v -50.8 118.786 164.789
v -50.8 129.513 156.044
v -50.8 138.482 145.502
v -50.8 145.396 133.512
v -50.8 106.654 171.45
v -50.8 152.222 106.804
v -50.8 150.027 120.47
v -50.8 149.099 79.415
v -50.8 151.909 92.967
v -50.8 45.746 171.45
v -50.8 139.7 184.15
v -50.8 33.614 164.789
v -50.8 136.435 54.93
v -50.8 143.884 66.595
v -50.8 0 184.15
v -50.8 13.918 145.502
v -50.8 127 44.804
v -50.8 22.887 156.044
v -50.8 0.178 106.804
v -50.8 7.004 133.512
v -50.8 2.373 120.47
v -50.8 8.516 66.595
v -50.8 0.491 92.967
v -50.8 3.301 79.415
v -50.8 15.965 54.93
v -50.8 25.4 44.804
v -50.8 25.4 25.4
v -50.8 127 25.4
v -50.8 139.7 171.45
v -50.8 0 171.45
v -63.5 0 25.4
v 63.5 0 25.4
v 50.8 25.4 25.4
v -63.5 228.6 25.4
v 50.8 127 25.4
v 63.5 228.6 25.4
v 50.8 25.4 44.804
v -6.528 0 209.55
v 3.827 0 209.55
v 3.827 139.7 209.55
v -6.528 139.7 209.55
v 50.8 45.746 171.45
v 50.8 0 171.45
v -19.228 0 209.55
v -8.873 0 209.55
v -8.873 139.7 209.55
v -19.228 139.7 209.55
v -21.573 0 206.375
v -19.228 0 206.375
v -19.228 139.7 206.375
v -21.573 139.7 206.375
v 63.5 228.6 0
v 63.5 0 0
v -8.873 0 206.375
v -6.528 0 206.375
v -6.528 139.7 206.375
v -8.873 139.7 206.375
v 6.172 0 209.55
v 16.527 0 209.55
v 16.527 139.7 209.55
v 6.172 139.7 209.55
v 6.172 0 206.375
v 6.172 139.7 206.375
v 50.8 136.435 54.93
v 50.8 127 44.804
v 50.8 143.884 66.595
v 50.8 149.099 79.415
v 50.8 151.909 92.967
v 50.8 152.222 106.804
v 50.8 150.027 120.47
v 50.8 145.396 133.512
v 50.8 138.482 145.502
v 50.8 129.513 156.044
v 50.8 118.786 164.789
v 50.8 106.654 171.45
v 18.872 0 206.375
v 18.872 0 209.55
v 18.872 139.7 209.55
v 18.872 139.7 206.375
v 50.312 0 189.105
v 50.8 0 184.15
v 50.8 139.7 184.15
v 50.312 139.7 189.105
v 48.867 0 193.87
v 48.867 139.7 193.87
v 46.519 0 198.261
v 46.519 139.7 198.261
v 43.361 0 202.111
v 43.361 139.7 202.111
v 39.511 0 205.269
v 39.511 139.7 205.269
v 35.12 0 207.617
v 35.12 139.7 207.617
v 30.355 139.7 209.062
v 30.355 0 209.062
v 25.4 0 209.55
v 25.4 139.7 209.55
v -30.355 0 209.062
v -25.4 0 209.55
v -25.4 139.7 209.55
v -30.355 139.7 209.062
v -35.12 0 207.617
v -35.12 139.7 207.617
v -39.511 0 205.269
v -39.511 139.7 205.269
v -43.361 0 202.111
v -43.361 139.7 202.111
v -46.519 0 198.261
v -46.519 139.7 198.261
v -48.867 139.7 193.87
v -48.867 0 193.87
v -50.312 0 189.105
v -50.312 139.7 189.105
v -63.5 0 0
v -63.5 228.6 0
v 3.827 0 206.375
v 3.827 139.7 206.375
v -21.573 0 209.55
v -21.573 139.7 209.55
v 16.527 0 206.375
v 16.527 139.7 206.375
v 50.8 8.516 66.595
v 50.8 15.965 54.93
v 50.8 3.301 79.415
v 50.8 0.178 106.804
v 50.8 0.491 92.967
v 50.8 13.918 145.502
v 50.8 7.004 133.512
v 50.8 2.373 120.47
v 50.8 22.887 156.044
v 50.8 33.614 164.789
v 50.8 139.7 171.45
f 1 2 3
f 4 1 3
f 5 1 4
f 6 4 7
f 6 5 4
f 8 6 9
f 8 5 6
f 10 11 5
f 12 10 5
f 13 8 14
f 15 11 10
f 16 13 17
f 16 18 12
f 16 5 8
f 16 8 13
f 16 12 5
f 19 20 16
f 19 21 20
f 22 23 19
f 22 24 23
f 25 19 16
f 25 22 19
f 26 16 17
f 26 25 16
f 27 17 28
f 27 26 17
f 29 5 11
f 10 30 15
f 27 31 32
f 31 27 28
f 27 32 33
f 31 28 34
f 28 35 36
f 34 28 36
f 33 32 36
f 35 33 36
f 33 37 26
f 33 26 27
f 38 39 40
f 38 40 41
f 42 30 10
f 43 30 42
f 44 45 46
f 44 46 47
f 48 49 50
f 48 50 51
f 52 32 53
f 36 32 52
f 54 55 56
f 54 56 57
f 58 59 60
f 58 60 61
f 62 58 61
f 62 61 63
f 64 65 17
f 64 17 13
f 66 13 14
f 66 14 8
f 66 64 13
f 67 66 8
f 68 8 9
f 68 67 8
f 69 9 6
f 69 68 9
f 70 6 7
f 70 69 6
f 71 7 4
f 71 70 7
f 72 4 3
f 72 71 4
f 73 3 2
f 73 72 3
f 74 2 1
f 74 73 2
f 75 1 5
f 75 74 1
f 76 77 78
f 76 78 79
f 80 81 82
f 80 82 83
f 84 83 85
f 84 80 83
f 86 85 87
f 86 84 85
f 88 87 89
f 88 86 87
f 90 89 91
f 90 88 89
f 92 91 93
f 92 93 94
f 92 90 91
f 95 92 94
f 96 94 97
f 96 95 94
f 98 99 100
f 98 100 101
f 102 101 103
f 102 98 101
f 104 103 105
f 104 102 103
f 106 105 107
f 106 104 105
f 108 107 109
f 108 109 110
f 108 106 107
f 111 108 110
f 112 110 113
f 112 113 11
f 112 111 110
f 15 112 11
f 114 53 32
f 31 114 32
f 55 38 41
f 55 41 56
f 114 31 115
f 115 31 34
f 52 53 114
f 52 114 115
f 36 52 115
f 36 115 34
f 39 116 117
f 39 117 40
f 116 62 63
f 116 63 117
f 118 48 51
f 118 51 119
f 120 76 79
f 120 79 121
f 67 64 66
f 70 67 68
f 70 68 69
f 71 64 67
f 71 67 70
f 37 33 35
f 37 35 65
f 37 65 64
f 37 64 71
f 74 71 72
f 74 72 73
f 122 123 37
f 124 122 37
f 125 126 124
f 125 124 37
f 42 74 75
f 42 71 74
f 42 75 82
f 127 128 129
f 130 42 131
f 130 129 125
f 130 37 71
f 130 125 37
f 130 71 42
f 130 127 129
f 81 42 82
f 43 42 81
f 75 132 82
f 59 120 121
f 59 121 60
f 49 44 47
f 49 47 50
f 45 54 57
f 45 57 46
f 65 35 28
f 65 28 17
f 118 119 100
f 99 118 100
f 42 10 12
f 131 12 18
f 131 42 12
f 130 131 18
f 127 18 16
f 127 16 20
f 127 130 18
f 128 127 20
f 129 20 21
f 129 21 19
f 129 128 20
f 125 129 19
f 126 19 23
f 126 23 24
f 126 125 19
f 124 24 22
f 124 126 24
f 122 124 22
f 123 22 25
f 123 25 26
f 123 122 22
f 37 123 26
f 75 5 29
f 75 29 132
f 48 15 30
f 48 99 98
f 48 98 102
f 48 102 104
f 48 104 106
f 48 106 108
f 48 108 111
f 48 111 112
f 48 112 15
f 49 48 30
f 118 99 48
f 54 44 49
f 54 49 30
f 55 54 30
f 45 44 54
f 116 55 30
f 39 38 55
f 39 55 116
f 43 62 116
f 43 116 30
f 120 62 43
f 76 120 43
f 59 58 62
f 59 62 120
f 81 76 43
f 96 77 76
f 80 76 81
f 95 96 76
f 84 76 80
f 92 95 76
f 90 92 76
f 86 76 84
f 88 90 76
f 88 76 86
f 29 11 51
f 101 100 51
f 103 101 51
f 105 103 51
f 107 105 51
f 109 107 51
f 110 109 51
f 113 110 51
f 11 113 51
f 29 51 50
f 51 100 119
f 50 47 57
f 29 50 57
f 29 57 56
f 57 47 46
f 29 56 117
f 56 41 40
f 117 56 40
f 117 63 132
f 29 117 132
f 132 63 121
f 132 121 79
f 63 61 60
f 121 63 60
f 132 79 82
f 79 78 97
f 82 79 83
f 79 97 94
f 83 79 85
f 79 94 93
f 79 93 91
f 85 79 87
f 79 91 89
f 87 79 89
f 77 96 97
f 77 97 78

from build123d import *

# Parameters (mm, degrees)
F0_W     = 228.6
F0_H     = 25.4
F1_DEPTH = 63.5
F3_DEPTH = 50.8
F5_DEPTH = 139.7


with BuildPart() as f1:
    # F0 (on Right) → F1 (new body, symmetric)
    with BuildSketch(Plane.YZ):
        with Locations((114.3, 12.7)):
            Rectangle(F0_W, F0_H)
    extrude(amount=F1_DEPTH, both=True)

    # F2 (on Right) → F3 (join, symmetric)
    with BuildSketch(Plane.YZ):
        with BuildLine():
            Line((127, 6.35), (127, 44.803873))
            ThreePointArc((127, 44.803873), (76.2, 177.8), (25.4, 44.803873))
            Line((25.4, 44.803873), (25.4, 6.35))
            Line((25.4, 6.35), (127, 6.35))
        make_face()
    extrude(amount=F3_DEPTH, both=True)

    # F4 (on Front) → F5 (join)
    with BuildSketch(Plane.XZ):
        with BuildLine():
            Line((-50.8, 184.15), (-50.8, 171.45))
            Line((-50.8, 171.45), (50.8, 171.45))
            Line((50.8, 171.45), (50.8, 184.15))
            ThreePointArc((50.8, 184.15), (43.360512, 202.110512), (25.4, 209.55))
            Line((25.4, 209.55), (18.872138, 209.55))
            Line((18.872138, 209.55), (18.872138, 206.375))
            Line((18.872138, 206.375), (16.527231, 206.375))
            Line((16.527231, 206.375), (16.527231, 209.55))
            Line((16.527231, 209.55), (6.172138, 209.55))
            Line((6.172138, 209.55), (6.172138, 206.375))
            Line((6.172138, 206.375), (3.827231, 206.375))
            Line((3.827231, 206.375), (3.827231, 209.55))
            Line((3.827231, 209.55), (-6.527862, 209.55))
            Line((-6.527862, 209.55), (-6.527862, 206.375))
            Line((-6.527862, 206.375), (-8.872769, 206.375))
            Line((-8.872769, 206.375), (-8.872769, 209.55))
            Line((-8.872769, 209.55), (-19.227862, 209.55))
            Line((-19.227862, 209.55), (-19.227862, 206.375))
            Line((-19.227862, 206.375), (-21.572769, 206.375))
            Line((-21.572769, 206.375), (-21.572769, 209.55))
            Line((-21.572769, 209.55), (-25.4, 209.55))
            ThreePointArc((-25.4, 209.55), (-43.360512, 202.110512), (-50.8, 184.15))
        make_face()
    extrude(amount=-F5_DEPTH)


solid = f1.part
